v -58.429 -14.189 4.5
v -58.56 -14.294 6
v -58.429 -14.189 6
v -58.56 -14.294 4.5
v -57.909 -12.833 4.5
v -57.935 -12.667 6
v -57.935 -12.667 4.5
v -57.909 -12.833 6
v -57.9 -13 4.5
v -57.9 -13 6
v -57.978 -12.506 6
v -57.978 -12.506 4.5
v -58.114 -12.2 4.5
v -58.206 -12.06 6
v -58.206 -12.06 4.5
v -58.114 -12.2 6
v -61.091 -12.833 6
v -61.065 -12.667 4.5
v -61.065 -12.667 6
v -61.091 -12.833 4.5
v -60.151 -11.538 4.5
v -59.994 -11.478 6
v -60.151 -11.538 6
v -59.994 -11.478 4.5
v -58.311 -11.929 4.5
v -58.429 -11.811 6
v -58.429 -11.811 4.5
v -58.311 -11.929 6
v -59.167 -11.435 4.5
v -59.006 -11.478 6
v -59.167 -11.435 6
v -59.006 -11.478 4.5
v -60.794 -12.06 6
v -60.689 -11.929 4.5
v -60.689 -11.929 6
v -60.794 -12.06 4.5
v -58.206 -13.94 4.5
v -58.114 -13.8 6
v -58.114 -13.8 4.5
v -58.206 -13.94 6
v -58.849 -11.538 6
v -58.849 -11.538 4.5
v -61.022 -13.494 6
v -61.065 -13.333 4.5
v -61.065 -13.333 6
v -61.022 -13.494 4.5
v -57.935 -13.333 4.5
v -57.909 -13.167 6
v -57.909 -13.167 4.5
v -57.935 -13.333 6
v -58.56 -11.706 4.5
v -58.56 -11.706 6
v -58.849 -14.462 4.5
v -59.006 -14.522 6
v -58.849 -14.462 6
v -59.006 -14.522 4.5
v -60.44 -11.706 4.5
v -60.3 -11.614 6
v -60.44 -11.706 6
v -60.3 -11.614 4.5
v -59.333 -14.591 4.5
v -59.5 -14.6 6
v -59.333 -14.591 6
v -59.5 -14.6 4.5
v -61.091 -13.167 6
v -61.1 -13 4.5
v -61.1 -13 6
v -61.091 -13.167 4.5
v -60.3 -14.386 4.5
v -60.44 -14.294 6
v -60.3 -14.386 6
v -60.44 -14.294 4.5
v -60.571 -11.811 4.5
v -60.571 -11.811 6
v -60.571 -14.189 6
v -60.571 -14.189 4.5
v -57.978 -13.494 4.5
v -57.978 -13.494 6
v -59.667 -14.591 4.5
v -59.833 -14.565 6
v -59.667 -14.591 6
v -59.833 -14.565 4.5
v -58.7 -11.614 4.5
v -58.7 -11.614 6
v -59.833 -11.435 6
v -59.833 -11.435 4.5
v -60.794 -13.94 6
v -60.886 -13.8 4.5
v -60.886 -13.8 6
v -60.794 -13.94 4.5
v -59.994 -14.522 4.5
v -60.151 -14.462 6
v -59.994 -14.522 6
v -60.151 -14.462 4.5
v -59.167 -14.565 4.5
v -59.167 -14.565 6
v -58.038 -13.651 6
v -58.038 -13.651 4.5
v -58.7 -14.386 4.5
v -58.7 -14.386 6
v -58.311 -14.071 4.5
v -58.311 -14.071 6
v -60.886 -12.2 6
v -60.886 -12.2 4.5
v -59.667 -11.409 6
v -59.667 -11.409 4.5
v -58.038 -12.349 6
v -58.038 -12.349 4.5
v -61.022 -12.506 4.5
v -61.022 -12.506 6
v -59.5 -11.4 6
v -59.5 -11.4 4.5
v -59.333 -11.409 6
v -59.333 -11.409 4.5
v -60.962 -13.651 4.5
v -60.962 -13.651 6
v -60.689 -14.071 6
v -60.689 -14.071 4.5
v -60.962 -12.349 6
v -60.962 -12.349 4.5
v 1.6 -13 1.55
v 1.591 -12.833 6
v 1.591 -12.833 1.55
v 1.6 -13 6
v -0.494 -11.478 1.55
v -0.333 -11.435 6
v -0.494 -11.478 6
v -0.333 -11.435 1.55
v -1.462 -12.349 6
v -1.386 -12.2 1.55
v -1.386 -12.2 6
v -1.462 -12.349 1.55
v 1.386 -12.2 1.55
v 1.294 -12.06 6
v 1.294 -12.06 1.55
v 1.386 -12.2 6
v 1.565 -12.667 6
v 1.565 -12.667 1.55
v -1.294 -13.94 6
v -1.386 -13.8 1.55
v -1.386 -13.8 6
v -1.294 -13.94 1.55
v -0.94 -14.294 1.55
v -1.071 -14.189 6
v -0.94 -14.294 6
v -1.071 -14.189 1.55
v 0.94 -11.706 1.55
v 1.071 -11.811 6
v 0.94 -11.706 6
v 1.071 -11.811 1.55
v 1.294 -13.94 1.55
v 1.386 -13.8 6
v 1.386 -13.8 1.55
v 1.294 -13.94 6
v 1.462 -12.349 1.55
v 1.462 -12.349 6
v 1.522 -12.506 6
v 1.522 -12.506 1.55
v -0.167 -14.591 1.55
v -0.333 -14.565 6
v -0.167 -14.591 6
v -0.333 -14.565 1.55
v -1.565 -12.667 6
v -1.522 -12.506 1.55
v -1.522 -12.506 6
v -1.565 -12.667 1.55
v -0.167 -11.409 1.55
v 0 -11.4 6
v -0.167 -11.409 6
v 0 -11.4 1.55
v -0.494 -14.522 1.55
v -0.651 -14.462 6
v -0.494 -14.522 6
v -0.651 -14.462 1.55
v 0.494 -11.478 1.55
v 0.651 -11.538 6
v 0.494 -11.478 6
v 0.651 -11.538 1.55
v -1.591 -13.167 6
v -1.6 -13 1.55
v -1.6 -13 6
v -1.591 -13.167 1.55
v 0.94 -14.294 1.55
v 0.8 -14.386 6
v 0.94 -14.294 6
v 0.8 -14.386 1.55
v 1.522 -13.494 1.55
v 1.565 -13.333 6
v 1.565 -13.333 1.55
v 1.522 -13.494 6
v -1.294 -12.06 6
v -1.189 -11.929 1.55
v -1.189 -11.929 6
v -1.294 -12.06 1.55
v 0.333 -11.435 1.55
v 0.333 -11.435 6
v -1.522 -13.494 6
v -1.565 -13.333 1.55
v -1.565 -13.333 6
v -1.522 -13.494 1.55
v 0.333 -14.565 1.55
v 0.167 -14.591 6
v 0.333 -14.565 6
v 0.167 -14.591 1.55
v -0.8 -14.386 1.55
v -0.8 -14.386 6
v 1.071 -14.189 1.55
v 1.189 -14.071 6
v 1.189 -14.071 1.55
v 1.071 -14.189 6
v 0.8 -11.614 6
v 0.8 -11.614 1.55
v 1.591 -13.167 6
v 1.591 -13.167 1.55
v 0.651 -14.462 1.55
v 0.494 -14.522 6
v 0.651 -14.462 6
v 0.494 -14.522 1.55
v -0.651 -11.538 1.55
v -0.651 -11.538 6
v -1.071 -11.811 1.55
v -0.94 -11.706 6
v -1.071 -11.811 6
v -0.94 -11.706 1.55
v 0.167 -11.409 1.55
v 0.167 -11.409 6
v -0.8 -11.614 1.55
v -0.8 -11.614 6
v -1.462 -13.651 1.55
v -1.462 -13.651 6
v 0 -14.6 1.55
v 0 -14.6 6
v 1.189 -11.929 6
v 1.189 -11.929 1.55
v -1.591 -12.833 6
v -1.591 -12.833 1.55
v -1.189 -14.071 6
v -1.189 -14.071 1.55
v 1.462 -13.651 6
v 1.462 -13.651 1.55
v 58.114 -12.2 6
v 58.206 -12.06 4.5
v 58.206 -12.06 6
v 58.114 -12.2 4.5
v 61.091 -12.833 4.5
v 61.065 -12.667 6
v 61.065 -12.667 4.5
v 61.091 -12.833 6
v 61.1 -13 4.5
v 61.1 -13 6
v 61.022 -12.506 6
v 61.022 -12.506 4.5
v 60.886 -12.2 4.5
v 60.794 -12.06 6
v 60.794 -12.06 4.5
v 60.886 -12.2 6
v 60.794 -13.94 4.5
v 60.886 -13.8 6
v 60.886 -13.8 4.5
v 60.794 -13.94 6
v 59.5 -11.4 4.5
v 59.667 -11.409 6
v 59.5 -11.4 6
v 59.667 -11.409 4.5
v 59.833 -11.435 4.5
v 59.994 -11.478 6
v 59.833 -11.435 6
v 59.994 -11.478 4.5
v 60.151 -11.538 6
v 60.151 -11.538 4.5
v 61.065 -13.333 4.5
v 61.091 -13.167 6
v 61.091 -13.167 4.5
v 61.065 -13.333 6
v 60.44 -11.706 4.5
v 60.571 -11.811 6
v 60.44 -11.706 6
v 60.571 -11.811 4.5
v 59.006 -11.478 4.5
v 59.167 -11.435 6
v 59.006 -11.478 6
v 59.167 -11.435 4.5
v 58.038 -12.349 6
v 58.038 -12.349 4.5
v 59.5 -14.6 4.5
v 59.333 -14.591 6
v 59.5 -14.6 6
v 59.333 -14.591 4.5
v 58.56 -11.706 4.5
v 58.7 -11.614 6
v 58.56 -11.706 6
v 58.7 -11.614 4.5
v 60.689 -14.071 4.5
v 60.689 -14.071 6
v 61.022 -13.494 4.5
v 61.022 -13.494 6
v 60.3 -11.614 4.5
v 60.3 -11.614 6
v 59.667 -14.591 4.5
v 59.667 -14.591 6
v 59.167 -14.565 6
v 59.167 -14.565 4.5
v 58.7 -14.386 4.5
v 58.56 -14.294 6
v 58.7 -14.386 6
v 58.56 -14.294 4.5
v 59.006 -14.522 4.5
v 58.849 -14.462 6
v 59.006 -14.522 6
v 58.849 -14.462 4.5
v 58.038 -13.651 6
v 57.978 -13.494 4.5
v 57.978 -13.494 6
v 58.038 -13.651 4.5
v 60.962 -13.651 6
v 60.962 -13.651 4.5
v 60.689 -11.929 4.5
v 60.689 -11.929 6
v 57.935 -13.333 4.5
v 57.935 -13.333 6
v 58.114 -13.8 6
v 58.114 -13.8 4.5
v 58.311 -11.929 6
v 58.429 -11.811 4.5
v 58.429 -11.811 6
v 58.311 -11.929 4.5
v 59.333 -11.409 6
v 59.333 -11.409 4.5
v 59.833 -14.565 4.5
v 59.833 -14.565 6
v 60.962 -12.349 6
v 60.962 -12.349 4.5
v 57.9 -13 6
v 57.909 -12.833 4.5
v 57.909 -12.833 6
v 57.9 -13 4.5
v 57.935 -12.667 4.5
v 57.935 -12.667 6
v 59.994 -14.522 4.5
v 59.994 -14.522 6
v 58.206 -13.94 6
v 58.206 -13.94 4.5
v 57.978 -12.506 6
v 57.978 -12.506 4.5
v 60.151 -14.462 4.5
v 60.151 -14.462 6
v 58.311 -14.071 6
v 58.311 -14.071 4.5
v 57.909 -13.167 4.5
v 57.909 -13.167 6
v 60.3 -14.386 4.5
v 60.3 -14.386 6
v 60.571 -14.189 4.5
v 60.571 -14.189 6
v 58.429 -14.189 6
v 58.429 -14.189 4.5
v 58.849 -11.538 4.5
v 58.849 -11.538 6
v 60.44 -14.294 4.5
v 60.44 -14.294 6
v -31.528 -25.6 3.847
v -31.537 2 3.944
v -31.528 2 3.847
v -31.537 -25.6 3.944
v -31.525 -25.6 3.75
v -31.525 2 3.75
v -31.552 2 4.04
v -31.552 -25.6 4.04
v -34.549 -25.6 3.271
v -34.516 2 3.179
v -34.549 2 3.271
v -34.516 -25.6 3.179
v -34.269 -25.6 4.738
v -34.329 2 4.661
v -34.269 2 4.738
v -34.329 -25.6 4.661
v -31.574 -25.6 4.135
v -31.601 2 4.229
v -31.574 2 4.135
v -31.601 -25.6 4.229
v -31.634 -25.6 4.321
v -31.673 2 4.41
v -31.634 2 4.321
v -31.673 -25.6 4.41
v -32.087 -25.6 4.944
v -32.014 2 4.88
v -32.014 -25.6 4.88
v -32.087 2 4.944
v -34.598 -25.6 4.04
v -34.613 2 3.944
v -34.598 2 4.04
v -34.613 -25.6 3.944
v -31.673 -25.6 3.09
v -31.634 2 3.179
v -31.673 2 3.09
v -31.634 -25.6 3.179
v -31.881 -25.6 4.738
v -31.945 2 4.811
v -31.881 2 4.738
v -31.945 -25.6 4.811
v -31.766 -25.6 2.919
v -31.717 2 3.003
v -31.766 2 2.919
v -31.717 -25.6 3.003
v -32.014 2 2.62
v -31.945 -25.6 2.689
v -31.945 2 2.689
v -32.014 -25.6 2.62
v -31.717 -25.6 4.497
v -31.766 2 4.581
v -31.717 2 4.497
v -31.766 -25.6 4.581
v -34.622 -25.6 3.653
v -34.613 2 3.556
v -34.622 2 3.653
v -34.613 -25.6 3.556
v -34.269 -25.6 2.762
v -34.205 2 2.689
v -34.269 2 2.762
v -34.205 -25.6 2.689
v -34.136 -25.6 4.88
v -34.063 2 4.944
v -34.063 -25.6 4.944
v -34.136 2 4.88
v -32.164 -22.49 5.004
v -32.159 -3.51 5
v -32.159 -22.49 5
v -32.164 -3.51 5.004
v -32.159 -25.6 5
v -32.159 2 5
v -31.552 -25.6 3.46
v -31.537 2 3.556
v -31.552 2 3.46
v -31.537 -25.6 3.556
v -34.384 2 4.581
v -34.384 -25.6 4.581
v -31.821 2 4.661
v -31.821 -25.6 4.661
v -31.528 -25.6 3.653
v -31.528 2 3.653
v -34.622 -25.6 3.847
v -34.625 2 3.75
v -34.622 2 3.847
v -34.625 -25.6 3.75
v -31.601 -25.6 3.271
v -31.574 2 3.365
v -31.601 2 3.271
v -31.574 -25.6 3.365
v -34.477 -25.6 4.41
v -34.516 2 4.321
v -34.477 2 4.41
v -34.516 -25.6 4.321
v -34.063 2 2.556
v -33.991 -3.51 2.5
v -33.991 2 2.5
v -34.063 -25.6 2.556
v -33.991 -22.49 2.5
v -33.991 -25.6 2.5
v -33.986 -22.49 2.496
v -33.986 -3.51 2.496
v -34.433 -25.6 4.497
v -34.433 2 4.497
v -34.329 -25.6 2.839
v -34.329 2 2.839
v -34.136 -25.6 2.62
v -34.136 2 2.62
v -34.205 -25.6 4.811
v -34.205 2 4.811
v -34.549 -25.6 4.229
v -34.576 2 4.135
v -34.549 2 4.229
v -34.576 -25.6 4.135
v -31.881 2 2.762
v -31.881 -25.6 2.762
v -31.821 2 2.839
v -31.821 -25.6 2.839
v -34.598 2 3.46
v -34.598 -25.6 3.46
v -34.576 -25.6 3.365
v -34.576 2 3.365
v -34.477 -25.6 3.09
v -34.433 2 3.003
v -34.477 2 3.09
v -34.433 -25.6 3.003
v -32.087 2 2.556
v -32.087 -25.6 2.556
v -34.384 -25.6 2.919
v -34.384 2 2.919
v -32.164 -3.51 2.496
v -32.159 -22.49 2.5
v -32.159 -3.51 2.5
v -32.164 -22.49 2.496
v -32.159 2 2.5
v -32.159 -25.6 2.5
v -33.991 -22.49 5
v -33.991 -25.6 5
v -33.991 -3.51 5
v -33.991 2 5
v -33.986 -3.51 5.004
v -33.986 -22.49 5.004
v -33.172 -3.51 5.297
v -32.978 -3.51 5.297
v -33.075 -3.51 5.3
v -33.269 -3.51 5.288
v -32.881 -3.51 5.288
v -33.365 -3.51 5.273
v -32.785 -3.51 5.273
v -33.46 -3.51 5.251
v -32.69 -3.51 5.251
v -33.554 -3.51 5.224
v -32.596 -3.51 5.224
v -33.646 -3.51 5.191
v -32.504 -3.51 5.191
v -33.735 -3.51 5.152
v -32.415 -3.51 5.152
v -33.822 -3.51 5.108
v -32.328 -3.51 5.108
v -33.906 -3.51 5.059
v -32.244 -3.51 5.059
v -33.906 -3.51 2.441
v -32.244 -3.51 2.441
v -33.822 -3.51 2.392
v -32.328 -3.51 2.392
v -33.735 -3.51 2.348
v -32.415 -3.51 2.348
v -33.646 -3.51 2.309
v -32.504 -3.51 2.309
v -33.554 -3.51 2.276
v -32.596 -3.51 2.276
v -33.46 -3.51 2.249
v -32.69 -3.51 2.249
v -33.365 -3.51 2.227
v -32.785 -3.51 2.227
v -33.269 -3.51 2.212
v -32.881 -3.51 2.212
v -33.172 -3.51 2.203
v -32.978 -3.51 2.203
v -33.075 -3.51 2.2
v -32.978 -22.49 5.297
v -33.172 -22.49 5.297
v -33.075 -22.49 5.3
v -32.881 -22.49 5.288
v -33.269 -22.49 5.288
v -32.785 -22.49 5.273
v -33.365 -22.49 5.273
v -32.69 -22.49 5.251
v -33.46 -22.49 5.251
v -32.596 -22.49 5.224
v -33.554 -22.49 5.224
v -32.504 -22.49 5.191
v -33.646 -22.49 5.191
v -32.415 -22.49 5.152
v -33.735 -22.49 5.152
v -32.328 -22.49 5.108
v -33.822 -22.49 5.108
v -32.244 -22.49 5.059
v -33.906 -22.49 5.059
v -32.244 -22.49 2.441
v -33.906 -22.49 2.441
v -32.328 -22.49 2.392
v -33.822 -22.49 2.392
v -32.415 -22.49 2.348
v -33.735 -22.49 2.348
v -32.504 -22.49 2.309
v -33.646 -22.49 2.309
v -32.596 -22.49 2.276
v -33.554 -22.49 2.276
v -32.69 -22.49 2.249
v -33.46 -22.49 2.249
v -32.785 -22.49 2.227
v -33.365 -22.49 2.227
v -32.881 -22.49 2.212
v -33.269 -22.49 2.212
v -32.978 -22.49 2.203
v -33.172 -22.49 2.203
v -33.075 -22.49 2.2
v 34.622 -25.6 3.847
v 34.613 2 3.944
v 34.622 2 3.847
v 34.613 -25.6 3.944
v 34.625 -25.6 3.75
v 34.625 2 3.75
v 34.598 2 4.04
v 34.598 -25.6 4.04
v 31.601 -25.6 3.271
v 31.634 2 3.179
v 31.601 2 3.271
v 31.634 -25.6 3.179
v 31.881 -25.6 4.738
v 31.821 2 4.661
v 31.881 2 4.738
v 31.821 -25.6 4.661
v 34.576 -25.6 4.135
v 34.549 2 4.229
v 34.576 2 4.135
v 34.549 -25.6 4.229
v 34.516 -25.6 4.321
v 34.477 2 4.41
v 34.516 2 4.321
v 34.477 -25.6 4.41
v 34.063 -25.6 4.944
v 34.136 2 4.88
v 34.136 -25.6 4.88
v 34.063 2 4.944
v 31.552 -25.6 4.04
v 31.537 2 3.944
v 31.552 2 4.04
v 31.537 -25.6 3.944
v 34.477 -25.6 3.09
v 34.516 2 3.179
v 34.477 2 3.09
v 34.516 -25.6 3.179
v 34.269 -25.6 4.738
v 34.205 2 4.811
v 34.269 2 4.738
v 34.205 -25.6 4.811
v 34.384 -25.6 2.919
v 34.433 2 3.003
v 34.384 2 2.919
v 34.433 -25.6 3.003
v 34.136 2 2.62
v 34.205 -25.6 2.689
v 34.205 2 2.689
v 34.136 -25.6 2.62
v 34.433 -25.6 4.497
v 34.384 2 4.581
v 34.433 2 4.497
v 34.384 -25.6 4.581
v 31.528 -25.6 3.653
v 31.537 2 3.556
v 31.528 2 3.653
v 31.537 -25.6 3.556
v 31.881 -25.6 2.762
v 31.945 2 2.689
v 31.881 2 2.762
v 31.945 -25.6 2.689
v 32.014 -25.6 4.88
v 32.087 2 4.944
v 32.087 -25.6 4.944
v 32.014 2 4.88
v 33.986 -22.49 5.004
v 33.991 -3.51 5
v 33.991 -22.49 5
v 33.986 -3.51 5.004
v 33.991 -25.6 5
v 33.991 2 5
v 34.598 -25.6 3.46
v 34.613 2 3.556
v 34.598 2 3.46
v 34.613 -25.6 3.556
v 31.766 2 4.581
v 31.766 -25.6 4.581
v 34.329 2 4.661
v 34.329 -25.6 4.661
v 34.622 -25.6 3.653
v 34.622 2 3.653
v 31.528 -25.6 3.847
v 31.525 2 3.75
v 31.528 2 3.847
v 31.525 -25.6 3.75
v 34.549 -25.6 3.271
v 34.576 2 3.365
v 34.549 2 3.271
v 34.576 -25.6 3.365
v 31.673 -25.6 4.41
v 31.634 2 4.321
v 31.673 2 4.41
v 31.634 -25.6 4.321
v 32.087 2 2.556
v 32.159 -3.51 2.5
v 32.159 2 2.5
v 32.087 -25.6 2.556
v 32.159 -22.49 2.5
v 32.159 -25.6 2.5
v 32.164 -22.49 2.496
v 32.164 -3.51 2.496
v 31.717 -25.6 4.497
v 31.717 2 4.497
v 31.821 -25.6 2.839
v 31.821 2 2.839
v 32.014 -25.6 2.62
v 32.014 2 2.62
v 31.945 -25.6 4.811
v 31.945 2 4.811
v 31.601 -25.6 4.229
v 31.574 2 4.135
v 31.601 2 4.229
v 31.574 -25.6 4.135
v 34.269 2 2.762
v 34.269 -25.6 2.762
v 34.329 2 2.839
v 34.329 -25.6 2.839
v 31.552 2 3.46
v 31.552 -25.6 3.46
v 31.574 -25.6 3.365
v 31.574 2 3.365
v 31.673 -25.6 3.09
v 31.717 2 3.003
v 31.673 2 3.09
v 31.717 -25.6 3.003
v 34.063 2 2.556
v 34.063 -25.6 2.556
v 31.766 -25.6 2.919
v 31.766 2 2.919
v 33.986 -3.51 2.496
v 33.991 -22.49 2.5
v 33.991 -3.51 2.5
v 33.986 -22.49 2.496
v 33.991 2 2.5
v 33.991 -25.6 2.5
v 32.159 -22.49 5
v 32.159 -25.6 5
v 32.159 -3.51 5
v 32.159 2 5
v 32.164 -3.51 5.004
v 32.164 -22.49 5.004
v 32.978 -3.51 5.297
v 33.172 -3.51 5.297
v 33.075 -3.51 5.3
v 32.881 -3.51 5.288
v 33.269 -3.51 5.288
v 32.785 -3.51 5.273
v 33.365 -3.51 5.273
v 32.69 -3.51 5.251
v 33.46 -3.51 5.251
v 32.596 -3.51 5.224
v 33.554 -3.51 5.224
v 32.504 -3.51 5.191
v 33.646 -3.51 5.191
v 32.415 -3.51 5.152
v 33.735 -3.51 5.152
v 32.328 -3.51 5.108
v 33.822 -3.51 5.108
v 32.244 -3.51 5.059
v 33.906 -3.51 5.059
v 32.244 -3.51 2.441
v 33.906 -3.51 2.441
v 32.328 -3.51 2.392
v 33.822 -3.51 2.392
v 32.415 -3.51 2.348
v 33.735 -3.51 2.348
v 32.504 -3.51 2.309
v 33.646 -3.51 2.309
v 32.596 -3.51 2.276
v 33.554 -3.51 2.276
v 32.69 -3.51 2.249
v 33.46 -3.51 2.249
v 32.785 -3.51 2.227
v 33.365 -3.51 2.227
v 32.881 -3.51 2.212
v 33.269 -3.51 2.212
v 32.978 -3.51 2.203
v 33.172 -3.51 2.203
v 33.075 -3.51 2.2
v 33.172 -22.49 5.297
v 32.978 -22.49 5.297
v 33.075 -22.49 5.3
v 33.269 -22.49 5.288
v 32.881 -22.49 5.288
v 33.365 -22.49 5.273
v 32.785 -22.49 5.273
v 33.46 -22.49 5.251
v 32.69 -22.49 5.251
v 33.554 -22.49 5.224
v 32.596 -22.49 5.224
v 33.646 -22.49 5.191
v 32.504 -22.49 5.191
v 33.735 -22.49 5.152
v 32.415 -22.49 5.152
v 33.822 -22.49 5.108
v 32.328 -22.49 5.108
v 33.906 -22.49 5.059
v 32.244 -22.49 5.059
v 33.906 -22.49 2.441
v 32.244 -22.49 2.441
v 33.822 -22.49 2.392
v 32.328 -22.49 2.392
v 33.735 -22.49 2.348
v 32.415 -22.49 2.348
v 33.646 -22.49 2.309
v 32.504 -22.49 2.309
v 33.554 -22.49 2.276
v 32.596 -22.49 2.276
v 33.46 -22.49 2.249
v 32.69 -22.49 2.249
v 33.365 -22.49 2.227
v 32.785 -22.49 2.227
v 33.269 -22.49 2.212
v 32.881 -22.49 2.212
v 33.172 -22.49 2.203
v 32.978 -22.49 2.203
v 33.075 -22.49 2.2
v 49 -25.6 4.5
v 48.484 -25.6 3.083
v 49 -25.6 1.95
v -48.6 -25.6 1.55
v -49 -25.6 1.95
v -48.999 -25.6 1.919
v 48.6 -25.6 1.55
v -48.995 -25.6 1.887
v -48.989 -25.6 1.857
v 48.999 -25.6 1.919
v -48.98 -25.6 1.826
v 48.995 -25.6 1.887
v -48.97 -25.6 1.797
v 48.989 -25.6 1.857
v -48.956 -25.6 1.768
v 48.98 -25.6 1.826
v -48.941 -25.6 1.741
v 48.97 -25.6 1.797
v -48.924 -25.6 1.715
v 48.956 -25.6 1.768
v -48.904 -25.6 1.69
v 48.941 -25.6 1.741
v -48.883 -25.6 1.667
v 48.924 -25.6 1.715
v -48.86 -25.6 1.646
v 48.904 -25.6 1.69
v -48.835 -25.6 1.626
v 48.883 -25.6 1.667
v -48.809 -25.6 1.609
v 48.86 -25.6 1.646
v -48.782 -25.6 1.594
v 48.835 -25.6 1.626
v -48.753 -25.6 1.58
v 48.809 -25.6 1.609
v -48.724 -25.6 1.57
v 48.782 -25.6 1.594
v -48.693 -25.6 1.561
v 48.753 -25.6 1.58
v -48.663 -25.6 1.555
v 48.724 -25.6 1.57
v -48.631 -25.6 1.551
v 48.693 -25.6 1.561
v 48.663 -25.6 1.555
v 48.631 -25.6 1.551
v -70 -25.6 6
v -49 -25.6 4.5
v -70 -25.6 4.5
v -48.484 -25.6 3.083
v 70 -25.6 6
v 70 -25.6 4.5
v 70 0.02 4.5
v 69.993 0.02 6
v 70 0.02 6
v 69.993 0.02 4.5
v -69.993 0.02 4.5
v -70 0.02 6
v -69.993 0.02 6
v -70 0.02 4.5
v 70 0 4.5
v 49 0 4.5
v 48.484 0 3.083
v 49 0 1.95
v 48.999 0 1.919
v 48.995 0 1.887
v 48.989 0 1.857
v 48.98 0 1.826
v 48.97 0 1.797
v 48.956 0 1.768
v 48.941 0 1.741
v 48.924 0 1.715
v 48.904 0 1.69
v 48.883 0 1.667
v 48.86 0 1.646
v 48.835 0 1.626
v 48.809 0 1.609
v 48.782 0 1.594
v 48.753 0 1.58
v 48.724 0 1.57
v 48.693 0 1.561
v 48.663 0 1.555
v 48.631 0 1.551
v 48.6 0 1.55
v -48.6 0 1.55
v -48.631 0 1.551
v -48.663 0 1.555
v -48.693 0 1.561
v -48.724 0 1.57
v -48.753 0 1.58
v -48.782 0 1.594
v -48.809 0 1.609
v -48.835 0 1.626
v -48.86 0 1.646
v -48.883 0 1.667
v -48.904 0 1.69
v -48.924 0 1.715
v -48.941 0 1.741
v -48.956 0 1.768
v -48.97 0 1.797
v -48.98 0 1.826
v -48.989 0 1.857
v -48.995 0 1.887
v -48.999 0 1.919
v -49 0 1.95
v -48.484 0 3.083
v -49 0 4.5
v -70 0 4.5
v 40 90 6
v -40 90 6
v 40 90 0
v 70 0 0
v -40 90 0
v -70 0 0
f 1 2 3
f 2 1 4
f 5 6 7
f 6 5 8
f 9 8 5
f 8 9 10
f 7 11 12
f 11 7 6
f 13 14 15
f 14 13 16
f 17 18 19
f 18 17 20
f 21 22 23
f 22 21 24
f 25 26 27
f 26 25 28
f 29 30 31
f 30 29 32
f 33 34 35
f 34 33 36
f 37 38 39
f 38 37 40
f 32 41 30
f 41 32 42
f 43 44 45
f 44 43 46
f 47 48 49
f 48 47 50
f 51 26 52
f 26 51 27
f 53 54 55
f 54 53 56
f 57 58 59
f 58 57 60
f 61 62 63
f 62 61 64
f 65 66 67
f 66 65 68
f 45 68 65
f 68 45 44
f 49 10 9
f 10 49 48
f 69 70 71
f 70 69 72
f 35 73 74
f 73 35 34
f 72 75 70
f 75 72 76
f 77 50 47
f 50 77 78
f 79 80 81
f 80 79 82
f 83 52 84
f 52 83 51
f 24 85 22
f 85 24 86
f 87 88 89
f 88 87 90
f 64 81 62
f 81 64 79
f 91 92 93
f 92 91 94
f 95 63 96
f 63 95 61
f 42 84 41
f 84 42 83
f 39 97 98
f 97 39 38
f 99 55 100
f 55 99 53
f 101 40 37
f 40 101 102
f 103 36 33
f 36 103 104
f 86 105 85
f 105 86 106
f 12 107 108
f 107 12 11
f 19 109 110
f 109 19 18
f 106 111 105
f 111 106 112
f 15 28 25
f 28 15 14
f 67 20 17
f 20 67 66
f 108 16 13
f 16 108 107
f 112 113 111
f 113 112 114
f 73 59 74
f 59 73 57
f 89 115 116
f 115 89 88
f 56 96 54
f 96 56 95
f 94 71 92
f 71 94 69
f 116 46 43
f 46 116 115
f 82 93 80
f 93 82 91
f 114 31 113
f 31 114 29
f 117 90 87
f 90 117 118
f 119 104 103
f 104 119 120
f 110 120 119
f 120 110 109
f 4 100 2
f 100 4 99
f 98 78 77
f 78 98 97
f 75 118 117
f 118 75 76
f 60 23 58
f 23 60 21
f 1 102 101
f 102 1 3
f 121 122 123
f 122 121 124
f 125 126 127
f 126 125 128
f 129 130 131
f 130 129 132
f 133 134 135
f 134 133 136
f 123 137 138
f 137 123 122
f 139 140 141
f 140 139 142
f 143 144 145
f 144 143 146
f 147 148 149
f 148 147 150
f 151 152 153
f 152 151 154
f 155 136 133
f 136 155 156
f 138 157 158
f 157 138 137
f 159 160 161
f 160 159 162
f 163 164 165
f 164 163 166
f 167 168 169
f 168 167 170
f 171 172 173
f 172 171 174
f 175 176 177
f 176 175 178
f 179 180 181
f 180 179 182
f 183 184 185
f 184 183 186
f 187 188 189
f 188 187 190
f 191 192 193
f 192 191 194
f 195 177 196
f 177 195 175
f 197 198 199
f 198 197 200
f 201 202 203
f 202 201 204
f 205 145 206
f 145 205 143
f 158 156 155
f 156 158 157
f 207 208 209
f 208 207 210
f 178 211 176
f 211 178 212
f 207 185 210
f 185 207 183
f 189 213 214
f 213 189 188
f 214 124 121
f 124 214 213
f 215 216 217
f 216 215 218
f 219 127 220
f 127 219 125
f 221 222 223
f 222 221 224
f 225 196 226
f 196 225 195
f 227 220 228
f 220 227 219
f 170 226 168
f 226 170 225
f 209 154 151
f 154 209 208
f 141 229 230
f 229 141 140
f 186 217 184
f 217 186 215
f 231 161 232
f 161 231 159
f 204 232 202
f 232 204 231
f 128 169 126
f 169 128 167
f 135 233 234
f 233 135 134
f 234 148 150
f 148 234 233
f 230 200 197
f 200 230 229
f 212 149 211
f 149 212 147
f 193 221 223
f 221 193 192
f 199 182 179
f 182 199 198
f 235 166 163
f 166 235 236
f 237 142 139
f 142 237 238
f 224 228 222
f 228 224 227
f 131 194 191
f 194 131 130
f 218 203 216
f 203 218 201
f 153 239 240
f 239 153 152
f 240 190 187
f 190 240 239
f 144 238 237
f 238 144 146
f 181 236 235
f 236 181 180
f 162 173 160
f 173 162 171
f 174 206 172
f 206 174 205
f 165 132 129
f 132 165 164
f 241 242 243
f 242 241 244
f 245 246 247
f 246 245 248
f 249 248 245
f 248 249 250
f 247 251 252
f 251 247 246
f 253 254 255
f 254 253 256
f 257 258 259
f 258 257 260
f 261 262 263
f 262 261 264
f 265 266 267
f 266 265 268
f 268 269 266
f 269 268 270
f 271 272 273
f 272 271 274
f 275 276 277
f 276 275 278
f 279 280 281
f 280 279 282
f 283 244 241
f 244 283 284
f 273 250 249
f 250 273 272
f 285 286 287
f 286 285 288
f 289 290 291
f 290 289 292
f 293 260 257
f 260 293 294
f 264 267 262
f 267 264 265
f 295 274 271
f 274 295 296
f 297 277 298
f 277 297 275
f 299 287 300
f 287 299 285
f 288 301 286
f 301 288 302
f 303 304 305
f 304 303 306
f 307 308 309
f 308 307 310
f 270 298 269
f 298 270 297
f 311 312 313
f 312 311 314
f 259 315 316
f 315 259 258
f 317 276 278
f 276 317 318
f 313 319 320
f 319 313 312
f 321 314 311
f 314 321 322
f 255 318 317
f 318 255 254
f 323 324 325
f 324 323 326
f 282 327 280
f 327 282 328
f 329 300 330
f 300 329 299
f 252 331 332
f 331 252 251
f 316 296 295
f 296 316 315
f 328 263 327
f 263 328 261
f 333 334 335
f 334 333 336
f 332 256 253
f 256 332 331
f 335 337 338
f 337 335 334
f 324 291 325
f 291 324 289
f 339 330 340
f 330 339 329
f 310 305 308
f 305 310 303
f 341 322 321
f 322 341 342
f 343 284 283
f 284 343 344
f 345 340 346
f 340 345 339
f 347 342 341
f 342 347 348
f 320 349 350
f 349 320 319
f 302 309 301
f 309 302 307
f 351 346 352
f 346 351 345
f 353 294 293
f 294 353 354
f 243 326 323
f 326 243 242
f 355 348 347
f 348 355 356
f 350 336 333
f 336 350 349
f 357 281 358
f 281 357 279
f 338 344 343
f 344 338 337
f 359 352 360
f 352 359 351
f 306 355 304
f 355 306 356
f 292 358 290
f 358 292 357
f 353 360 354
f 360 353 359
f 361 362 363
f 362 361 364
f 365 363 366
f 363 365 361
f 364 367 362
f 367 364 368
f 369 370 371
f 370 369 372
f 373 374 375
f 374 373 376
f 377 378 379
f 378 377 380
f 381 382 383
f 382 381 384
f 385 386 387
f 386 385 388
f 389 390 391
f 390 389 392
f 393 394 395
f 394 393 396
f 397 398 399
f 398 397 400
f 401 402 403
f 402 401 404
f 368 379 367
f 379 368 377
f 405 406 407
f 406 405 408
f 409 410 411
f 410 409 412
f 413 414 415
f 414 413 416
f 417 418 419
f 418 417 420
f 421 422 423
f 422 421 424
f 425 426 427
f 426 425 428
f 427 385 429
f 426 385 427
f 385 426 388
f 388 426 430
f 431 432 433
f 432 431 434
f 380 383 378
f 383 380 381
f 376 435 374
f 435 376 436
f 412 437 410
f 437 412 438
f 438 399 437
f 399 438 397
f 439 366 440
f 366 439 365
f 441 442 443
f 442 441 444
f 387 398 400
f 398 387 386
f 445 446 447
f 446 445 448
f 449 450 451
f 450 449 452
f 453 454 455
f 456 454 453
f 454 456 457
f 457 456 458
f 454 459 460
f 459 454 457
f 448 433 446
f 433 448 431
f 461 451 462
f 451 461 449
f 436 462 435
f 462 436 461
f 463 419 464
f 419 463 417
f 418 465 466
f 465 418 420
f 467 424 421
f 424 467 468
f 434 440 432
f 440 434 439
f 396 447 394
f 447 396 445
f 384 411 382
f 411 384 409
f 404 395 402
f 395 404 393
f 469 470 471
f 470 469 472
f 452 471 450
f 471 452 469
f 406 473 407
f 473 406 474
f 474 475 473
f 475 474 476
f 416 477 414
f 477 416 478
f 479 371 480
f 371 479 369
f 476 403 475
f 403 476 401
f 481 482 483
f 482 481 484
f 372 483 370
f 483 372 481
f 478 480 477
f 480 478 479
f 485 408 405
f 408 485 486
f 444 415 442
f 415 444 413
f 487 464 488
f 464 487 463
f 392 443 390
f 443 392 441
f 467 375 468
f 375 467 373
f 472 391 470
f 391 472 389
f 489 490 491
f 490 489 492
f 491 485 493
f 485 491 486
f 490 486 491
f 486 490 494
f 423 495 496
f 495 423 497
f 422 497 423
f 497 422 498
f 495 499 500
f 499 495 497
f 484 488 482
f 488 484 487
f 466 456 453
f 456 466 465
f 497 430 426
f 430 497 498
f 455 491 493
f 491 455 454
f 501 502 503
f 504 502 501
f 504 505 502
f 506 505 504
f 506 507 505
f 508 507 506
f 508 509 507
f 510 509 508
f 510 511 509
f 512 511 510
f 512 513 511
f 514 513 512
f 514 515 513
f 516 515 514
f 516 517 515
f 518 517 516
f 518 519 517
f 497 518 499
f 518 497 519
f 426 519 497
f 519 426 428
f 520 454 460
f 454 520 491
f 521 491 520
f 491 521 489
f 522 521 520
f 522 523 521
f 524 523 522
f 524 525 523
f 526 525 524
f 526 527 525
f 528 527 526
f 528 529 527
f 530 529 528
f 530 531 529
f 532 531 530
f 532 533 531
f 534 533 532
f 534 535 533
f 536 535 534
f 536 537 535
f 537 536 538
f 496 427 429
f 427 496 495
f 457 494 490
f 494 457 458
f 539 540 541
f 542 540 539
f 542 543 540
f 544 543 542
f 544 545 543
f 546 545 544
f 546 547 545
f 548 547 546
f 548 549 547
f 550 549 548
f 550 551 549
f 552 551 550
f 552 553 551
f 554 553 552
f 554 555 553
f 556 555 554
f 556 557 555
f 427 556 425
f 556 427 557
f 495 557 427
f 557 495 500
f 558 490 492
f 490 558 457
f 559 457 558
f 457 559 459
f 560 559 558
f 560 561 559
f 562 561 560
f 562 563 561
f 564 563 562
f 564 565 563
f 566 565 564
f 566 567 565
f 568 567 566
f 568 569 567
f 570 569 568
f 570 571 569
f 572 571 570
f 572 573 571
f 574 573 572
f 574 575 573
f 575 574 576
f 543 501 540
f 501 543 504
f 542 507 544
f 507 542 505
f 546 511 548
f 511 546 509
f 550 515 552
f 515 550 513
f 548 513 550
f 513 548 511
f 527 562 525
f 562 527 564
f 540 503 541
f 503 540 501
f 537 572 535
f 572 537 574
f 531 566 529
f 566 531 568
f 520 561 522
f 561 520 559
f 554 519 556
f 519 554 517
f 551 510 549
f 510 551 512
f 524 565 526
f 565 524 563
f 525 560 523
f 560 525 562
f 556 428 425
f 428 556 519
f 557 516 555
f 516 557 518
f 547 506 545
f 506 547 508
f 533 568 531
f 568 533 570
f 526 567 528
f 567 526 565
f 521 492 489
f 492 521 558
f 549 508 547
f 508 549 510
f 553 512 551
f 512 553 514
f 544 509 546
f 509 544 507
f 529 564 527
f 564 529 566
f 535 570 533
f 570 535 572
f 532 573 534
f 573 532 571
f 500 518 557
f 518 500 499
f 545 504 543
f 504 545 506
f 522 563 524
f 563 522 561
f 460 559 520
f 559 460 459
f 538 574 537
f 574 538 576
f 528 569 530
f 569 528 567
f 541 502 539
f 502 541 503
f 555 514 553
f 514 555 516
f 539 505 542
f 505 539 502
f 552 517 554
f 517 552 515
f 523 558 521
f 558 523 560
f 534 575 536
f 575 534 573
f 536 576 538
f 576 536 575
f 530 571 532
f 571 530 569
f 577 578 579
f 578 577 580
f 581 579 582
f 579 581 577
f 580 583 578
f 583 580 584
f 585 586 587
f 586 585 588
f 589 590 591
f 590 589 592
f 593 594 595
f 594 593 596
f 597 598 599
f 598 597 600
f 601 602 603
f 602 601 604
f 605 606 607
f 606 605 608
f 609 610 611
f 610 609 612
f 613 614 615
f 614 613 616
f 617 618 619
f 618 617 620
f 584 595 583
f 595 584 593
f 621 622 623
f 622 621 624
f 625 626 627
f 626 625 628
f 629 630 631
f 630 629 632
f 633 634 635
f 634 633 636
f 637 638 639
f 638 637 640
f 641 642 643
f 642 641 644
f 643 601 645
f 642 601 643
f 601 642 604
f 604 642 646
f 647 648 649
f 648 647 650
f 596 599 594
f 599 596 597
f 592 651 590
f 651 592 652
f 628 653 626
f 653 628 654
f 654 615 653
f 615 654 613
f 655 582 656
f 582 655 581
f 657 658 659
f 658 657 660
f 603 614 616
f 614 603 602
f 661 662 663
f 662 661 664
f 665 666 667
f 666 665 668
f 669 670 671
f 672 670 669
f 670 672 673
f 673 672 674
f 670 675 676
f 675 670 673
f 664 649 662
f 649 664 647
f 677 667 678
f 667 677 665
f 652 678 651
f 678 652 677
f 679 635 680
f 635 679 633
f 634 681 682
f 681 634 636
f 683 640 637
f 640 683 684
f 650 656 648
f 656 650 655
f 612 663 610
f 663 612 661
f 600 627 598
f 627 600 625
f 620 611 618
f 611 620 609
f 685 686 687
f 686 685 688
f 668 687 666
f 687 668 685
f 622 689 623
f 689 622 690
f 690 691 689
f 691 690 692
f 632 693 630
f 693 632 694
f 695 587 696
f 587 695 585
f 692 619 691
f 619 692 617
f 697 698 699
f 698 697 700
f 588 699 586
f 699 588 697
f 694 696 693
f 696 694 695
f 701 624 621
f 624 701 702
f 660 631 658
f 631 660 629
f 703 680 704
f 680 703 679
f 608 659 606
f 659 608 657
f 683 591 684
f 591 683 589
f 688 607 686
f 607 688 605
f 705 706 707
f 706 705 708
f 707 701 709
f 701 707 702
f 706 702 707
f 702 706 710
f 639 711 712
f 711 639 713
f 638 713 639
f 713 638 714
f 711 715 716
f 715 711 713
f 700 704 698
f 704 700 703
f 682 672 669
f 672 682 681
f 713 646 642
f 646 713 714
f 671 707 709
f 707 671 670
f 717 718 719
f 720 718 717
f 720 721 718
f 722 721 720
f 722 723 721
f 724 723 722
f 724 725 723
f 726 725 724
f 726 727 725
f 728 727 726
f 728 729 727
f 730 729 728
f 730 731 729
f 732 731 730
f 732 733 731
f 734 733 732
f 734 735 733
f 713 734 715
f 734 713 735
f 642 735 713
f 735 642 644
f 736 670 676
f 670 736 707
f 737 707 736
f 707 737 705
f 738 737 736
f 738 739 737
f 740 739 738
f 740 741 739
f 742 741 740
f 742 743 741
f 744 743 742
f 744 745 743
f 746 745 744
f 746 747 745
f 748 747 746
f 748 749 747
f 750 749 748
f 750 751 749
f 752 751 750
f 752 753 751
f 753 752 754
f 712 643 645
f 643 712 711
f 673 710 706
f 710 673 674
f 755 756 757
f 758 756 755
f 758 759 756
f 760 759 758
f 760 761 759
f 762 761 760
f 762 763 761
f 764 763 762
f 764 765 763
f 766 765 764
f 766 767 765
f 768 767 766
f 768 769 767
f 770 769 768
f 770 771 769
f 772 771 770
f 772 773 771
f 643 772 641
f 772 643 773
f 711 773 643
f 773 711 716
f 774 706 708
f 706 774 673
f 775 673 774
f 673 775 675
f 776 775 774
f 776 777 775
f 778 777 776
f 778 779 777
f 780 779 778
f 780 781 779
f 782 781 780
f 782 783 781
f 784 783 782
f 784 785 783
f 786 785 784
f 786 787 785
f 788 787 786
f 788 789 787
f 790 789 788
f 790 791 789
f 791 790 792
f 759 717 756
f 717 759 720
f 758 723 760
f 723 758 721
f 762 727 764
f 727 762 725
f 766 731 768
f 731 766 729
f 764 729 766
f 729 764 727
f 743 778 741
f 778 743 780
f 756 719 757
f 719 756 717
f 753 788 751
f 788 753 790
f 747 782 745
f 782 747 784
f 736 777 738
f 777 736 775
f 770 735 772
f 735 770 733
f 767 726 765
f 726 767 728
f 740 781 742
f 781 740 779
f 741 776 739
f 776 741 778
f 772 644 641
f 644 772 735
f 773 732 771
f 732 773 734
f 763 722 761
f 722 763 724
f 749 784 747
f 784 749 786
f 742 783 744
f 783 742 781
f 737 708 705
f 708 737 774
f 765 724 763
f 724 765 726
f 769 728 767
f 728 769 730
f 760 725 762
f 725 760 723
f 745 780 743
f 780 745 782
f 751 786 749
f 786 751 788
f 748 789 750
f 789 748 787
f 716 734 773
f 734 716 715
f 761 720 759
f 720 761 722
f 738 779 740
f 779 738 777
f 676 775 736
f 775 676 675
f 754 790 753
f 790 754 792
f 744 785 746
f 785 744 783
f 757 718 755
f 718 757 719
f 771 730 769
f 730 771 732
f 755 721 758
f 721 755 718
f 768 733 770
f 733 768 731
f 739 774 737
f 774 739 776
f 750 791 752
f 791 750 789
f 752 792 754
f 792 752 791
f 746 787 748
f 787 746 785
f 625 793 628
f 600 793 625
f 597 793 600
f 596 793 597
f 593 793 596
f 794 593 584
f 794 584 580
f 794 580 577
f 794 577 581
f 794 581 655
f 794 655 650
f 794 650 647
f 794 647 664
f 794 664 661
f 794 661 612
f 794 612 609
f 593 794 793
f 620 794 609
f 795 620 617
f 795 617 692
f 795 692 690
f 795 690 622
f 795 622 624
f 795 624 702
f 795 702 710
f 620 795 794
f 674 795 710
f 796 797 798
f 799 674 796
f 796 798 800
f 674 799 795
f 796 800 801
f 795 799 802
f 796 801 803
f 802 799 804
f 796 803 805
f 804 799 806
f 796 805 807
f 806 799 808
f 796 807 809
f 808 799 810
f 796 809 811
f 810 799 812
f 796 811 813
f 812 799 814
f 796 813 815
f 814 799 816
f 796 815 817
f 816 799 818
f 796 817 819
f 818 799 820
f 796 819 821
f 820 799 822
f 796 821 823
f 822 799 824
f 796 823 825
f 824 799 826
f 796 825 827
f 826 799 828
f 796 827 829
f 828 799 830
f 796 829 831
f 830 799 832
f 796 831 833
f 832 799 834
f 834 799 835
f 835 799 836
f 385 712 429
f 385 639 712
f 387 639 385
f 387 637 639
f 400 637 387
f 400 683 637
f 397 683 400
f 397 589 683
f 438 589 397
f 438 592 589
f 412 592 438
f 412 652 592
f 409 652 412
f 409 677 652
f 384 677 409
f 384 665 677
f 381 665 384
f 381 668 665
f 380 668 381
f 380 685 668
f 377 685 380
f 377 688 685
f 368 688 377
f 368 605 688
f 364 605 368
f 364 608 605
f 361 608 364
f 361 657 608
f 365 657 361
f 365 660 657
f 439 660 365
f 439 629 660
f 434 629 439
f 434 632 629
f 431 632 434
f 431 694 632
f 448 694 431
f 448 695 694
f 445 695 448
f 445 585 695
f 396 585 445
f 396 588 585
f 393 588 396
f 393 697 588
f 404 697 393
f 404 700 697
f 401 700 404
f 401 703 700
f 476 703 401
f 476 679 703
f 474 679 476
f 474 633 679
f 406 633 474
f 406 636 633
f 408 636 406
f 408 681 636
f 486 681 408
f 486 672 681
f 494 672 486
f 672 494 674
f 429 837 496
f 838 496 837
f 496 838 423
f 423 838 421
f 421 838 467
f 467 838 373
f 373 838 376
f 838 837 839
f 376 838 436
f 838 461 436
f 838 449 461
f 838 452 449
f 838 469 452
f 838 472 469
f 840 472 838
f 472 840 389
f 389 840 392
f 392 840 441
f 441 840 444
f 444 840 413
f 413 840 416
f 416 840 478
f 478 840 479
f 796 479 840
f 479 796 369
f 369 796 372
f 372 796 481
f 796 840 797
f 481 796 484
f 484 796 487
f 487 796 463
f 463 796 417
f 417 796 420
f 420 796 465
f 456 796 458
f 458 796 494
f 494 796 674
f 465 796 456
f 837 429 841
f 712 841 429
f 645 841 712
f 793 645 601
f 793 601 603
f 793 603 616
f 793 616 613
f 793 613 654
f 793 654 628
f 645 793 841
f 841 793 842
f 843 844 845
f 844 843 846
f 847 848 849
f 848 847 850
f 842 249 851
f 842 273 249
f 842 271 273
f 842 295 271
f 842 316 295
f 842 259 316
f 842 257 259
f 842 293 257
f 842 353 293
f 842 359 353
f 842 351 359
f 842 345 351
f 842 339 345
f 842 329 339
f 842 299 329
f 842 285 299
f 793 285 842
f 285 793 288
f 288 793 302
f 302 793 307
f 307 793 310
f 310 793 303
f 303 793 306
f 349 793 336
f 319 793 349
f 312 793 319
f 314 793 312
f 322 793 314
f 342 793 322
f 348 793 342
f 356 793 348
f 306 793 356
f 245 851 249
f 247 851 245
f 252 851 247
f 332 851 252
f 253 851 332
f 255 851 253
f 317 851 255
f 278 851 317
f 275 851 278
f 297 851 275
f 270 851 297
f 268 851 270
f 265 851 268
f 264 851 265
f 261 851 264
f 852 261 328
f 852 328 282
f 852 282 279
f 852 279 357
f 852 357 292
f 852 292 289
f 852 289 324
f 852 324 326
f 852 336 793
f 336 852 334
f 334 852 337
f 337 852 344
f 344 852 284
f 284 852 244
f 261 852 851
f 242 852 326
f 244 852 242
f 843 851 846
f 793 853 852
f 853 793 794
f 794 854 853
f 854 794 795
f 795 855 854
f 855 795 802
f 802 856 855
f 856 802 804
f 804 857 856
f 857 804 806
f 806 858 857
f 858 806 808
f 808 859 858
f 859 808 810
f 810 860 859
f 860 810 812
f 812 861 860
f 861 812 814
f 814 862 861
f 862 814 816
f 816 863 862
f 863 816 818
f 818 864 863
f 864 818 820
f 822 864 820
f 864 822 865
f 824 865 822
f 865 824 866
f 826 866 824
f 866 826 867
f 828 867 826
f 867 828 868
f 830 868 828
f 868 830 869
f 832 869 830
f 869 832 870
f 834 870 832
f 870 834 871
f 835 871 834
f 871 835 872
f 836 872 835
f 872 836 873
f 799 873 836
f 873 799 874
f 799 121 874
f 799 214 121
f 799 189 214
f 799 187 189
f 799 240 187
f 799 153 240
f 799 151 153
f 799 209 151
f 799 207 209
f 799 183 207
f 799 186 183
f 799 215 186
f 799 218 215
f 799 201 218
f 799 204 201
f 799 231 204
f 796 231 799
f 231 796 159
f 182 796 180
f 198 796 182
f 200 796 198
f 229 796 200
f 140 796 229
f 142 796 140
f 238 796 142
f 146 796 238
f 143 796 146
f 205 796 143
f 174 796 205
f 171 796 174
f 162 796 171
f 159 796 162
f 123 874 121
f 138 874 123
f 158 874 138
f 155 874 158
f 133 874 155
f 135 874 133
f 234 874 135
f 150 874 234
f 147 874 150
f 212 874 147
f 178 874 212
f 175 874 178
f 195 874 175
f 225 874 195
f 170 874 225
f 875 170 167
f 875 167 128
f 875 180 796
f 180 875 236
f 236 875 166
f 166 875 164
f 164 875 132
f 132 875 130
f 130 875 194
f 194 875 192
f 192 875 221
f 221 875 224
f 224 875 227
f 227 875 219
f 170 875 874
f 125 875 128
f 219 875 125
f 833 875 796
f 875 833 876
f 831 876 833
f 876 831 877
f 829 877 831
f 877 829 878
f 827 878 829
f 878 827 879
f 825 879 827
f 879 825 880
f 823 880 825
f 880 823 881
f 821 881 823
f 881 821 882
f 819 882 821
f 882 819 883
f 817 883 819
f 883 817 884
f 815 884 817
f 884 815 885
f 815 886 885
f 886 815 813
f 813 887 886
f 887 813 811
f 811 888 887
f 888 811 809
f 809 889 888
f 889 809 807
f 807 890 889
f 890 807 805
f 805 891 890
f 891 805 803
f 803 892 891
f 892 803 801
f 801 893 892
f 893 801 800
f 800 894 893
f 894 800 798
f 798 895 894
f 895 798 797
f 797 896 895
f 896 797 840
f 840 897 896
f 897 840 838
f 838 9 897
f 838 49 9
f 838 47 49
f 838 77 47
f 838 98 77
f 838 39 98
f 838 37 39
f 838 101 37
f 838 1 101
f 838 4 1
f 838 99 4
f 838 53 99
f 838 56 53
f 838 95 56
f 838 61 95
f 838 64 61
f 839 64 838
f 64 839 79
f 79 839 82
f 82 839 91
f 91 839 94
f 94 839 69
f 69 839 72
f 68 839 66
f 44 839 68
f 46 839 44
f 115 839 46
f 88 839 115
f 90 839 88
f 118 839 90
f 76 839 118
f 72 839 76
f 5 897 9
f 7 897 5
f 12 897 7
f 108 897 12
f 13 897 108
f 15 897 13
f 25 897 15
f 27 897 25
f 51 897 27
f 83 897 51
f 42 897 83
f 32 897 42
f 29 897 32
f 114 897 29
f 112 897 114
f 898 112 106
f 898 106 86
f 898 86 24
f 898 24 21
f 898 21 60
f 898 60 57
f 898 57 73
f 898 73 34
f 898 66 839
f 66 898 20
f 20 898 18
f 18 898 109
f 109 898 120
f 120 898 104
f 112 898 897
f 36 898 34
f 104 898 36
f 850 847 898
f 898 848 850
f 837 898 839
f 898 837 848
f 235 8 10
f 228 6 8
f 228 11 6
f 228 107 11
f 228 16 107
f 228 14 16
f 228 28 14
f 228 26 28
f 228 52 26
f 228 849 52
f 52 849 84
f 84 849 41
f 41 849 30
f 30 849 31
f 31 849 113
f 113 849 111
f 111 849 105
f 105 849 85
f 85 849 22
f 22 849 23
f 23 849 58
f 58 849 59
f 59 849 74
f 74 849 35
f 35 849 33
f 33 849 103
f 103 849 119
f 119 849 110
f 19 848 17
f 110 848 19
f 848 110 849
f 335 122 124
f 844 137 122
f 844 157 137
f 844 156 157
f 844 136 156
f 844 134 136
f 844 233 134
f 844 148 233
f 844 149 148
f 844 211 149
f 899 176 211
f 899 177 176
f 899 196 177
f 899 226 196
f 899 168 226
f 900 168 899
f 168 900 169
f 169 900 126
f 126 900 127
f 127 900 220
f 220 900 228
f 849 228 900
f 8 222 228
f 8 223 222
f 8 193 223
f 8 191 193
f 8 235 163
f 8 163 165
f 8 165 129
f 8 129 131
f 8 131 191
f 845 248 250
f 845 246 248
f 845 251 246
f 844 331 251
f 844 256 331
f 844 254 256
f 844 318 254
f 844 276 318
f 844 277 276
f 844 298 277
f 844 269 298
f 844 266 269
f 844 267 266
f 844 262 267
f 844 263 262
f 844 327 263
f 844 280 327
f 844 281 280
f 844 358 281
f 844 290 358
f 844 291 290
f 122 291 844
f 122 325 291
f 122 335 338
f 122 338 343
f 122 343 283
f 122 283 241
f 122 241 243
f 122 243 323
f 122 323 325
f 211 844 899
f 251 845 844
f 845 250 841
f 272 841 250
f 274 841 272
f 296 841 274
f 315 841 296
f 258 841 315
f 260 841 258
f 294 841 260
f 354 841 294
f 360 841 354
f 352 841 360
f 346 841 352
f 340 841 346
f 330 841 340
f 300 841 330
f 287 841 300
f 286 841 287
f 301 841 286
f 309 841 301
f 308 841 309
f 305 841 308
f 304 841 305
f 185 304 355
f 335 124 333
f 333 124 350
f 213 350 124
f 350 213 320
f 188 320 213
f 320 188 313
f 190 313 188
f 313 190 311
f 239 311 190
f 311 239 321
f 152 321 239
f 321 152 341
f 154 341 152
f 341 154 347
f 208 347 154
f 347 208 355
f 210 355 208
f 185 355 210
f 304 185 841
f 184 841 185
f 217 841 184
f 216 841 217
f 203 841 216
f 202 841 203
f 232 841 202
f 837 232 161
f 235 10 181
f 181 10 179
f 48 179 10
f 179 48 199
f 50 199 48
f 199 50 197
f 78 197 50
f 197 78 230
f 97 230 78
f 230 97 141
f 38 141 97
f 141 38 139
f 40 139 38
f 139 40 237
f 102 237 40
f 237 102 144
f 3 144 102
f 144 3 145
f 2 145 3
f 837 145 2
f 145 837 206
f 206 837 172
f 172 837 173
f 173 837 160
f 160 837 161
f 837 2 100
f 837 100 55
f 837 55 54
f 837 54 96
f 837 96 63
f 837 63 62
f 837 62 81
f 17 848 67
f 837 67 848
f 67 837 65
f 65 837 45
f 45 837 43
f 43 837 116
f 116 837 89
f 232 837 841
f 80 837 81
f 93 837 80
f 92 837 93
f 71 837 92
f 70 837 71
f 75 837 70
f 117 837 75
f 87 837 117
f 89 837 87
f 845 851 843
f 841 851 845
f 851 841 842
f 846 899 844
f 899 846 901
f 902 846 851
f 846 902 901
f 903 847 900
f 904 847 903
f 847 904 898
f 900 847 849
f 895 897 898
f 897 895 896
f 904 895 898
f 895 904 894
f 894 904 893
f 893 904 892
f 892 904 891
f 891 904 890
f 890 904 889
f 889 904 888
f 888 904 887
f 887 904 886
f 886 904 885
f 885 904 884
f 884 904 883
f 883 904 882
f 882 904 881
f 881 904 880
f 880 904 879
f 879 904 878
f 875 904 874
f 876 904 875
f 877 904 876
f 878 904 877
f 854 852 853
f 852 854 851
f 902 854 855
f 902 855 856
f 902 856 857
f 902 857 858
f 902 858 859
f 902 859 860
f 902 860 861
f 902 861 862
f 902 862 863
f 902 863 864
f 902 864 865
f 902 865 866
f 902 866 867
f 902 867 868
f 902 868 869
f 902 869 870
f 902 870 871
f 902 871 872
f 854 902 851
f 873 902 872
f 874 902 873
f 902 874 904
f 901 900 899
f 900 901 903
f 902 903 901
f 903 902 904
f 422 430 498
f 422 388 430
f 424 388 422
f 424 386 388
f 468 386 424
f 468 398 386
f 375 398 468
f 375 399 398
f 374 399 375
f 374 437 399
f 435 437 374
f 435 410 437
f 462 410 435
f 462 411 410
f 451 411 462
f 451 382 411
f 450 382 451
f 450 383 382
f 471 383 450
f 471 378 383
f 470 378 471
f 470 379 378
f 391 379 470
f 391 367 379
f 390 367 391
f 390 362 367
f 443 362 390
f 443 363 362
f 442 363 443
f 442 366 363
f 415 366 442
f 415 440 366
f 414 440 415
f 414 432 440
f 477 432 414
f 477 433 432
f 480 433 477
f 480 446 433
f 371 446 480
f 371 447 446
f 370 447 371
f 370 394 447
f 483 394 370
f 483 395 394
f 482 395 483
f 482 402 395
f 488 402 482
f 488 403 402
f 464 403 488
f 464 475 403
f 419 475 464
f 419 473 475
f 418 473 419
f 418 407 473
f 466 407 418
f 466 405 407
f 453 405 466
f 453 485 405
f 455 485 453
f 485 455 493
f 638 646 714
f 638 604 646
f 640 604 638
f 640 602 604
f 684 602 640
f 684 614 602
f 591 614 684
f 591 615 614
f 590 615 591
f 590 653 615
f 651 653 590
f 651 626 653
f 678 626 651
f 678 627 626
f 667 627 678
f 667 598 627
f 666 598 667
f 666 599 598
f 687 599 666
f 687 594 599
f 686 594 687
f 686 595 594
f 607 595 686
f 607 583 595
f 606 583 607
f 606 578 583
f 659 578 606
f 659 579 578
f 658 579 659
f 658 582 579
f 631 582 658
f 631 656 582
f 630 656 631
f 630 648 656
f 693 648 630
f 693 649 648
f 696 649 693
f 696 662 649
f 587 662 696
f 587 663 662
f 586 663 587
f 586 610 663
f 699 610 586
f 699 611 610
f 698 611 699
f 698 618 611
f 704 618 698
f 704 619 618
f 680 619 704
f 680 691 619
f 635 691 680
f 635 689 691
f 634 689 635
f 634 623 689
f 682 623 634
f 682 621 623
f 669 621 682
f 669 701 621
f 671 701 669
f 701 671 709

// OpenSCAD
/**
  * Module: Plate joint example.
  *
  * Two mating plates share one joint configuration and full-length pin cutters.
  */
include <../../colors.scad>

use <../../lib/shapes3d.scad>
use <../../lib/transforms.scad>
use <../../lib/trapezoids.scad>
use <plate_joint.scad>

plate_thickness         = 6;

bolt_d                  = 3.2;
pin_d                   = 3.1;
pin_l                   = 30;

joint_l                 = 26;

plate_a_top             = 80;
plate_a_bottom          = 140;
plate_a_l               = 90;

plate_b_top             = plate_a_bottom;
plate_b_bottom          = 200;
plate_b_l               = 120;

plates_assembly_spacing = 50; // [0:1:50]
show_joint_bolts        = true;
show_joint_sizes        = false;

// Shared edge: Y=0. Plate A occupies +Y; plate B occupies -Y.
// The male tongue and female socket occupy Y=-joint_l..0.
// Positive assembly spacing slides plate B along -Y for inspection.

module common_plate_joint(mode,
                          slot_mode=false,
                          show_bolts=false,
                          anchor,
                          show_sizes) {
  plate_joint(plate_h=plate_thickness,
              bolt_d=bolt_d,
              pin_d=pin_d,
              pin_l=pin_l,
              l=joint_l,
              show_bolts=show_bolts,
              show_sizes=show_sizes,
              sizes_offset=[30, 0, 0],
              rail_w="70%",
              mode=mode,
              slot_mode=slot_mode,
              include_pin_holes=true,
              anchor=anchor,
              w=min(plate_a_bottom, plate_b_top),
              color=mode == "female" ? cobalt_blue_light_1 : cobalt_blue_dark_1);
}

module plate_a() {
  color(cobalt_blue_dark_1) {
    difference() {
      union() {
        color(cobalt_blue_dark_1) {
          with_anchor(anchor=[0, 1, 1],
                      size=[max(plate_a_bottom, plate_a_top), plate_a_l, plate_thickness],
                      centered=true) {
            linear_extrude(height=plate_thickness) {
              trapezoid(b=plate_a_bottom,
                        t=plate_a_top,
                        h=plate_a_l,
                        center=true);
            }
          }
        }
        common_plate_joint(mode="male",
                           show_bolts=show_joint_bolts,
                           show_sizes=show_joint_sizes);
      }
      // Subtract at parent scope: pins continue beyond the tongue into plate A.
      #common_plate_joint(mode="male", slot_mode=true);
    }
  }
}

module plate_b() {
  color(cobalt_blue_light_1) {
    difference() {
      color(cobalt_blue_light_1) {
        with_anchor(anchor=[0, -1, 1],
                    size=[max(plate_b_bottom, plate_b_top), plate_b_l, plate_thickness],
                    centered=true) {
          linear_extrude(height=plate_thickness) {
            trapezoid(b=plate_b_bottom,
                      t=plate_b_top,
                      h=plate_b_l,
                      center=true);
          }
        }
      }
      // The same configuration cuts the socket, bolt holes and pin passages.
      common_plate_joint(mode="female", slot_mode=true);
    }
  }
}

module assembly_example() {
  plate_a();
  // translate([0, -plates_assembly_spacing, 0]) {
  //   plate_b();
  // }
}

assembly_example();
